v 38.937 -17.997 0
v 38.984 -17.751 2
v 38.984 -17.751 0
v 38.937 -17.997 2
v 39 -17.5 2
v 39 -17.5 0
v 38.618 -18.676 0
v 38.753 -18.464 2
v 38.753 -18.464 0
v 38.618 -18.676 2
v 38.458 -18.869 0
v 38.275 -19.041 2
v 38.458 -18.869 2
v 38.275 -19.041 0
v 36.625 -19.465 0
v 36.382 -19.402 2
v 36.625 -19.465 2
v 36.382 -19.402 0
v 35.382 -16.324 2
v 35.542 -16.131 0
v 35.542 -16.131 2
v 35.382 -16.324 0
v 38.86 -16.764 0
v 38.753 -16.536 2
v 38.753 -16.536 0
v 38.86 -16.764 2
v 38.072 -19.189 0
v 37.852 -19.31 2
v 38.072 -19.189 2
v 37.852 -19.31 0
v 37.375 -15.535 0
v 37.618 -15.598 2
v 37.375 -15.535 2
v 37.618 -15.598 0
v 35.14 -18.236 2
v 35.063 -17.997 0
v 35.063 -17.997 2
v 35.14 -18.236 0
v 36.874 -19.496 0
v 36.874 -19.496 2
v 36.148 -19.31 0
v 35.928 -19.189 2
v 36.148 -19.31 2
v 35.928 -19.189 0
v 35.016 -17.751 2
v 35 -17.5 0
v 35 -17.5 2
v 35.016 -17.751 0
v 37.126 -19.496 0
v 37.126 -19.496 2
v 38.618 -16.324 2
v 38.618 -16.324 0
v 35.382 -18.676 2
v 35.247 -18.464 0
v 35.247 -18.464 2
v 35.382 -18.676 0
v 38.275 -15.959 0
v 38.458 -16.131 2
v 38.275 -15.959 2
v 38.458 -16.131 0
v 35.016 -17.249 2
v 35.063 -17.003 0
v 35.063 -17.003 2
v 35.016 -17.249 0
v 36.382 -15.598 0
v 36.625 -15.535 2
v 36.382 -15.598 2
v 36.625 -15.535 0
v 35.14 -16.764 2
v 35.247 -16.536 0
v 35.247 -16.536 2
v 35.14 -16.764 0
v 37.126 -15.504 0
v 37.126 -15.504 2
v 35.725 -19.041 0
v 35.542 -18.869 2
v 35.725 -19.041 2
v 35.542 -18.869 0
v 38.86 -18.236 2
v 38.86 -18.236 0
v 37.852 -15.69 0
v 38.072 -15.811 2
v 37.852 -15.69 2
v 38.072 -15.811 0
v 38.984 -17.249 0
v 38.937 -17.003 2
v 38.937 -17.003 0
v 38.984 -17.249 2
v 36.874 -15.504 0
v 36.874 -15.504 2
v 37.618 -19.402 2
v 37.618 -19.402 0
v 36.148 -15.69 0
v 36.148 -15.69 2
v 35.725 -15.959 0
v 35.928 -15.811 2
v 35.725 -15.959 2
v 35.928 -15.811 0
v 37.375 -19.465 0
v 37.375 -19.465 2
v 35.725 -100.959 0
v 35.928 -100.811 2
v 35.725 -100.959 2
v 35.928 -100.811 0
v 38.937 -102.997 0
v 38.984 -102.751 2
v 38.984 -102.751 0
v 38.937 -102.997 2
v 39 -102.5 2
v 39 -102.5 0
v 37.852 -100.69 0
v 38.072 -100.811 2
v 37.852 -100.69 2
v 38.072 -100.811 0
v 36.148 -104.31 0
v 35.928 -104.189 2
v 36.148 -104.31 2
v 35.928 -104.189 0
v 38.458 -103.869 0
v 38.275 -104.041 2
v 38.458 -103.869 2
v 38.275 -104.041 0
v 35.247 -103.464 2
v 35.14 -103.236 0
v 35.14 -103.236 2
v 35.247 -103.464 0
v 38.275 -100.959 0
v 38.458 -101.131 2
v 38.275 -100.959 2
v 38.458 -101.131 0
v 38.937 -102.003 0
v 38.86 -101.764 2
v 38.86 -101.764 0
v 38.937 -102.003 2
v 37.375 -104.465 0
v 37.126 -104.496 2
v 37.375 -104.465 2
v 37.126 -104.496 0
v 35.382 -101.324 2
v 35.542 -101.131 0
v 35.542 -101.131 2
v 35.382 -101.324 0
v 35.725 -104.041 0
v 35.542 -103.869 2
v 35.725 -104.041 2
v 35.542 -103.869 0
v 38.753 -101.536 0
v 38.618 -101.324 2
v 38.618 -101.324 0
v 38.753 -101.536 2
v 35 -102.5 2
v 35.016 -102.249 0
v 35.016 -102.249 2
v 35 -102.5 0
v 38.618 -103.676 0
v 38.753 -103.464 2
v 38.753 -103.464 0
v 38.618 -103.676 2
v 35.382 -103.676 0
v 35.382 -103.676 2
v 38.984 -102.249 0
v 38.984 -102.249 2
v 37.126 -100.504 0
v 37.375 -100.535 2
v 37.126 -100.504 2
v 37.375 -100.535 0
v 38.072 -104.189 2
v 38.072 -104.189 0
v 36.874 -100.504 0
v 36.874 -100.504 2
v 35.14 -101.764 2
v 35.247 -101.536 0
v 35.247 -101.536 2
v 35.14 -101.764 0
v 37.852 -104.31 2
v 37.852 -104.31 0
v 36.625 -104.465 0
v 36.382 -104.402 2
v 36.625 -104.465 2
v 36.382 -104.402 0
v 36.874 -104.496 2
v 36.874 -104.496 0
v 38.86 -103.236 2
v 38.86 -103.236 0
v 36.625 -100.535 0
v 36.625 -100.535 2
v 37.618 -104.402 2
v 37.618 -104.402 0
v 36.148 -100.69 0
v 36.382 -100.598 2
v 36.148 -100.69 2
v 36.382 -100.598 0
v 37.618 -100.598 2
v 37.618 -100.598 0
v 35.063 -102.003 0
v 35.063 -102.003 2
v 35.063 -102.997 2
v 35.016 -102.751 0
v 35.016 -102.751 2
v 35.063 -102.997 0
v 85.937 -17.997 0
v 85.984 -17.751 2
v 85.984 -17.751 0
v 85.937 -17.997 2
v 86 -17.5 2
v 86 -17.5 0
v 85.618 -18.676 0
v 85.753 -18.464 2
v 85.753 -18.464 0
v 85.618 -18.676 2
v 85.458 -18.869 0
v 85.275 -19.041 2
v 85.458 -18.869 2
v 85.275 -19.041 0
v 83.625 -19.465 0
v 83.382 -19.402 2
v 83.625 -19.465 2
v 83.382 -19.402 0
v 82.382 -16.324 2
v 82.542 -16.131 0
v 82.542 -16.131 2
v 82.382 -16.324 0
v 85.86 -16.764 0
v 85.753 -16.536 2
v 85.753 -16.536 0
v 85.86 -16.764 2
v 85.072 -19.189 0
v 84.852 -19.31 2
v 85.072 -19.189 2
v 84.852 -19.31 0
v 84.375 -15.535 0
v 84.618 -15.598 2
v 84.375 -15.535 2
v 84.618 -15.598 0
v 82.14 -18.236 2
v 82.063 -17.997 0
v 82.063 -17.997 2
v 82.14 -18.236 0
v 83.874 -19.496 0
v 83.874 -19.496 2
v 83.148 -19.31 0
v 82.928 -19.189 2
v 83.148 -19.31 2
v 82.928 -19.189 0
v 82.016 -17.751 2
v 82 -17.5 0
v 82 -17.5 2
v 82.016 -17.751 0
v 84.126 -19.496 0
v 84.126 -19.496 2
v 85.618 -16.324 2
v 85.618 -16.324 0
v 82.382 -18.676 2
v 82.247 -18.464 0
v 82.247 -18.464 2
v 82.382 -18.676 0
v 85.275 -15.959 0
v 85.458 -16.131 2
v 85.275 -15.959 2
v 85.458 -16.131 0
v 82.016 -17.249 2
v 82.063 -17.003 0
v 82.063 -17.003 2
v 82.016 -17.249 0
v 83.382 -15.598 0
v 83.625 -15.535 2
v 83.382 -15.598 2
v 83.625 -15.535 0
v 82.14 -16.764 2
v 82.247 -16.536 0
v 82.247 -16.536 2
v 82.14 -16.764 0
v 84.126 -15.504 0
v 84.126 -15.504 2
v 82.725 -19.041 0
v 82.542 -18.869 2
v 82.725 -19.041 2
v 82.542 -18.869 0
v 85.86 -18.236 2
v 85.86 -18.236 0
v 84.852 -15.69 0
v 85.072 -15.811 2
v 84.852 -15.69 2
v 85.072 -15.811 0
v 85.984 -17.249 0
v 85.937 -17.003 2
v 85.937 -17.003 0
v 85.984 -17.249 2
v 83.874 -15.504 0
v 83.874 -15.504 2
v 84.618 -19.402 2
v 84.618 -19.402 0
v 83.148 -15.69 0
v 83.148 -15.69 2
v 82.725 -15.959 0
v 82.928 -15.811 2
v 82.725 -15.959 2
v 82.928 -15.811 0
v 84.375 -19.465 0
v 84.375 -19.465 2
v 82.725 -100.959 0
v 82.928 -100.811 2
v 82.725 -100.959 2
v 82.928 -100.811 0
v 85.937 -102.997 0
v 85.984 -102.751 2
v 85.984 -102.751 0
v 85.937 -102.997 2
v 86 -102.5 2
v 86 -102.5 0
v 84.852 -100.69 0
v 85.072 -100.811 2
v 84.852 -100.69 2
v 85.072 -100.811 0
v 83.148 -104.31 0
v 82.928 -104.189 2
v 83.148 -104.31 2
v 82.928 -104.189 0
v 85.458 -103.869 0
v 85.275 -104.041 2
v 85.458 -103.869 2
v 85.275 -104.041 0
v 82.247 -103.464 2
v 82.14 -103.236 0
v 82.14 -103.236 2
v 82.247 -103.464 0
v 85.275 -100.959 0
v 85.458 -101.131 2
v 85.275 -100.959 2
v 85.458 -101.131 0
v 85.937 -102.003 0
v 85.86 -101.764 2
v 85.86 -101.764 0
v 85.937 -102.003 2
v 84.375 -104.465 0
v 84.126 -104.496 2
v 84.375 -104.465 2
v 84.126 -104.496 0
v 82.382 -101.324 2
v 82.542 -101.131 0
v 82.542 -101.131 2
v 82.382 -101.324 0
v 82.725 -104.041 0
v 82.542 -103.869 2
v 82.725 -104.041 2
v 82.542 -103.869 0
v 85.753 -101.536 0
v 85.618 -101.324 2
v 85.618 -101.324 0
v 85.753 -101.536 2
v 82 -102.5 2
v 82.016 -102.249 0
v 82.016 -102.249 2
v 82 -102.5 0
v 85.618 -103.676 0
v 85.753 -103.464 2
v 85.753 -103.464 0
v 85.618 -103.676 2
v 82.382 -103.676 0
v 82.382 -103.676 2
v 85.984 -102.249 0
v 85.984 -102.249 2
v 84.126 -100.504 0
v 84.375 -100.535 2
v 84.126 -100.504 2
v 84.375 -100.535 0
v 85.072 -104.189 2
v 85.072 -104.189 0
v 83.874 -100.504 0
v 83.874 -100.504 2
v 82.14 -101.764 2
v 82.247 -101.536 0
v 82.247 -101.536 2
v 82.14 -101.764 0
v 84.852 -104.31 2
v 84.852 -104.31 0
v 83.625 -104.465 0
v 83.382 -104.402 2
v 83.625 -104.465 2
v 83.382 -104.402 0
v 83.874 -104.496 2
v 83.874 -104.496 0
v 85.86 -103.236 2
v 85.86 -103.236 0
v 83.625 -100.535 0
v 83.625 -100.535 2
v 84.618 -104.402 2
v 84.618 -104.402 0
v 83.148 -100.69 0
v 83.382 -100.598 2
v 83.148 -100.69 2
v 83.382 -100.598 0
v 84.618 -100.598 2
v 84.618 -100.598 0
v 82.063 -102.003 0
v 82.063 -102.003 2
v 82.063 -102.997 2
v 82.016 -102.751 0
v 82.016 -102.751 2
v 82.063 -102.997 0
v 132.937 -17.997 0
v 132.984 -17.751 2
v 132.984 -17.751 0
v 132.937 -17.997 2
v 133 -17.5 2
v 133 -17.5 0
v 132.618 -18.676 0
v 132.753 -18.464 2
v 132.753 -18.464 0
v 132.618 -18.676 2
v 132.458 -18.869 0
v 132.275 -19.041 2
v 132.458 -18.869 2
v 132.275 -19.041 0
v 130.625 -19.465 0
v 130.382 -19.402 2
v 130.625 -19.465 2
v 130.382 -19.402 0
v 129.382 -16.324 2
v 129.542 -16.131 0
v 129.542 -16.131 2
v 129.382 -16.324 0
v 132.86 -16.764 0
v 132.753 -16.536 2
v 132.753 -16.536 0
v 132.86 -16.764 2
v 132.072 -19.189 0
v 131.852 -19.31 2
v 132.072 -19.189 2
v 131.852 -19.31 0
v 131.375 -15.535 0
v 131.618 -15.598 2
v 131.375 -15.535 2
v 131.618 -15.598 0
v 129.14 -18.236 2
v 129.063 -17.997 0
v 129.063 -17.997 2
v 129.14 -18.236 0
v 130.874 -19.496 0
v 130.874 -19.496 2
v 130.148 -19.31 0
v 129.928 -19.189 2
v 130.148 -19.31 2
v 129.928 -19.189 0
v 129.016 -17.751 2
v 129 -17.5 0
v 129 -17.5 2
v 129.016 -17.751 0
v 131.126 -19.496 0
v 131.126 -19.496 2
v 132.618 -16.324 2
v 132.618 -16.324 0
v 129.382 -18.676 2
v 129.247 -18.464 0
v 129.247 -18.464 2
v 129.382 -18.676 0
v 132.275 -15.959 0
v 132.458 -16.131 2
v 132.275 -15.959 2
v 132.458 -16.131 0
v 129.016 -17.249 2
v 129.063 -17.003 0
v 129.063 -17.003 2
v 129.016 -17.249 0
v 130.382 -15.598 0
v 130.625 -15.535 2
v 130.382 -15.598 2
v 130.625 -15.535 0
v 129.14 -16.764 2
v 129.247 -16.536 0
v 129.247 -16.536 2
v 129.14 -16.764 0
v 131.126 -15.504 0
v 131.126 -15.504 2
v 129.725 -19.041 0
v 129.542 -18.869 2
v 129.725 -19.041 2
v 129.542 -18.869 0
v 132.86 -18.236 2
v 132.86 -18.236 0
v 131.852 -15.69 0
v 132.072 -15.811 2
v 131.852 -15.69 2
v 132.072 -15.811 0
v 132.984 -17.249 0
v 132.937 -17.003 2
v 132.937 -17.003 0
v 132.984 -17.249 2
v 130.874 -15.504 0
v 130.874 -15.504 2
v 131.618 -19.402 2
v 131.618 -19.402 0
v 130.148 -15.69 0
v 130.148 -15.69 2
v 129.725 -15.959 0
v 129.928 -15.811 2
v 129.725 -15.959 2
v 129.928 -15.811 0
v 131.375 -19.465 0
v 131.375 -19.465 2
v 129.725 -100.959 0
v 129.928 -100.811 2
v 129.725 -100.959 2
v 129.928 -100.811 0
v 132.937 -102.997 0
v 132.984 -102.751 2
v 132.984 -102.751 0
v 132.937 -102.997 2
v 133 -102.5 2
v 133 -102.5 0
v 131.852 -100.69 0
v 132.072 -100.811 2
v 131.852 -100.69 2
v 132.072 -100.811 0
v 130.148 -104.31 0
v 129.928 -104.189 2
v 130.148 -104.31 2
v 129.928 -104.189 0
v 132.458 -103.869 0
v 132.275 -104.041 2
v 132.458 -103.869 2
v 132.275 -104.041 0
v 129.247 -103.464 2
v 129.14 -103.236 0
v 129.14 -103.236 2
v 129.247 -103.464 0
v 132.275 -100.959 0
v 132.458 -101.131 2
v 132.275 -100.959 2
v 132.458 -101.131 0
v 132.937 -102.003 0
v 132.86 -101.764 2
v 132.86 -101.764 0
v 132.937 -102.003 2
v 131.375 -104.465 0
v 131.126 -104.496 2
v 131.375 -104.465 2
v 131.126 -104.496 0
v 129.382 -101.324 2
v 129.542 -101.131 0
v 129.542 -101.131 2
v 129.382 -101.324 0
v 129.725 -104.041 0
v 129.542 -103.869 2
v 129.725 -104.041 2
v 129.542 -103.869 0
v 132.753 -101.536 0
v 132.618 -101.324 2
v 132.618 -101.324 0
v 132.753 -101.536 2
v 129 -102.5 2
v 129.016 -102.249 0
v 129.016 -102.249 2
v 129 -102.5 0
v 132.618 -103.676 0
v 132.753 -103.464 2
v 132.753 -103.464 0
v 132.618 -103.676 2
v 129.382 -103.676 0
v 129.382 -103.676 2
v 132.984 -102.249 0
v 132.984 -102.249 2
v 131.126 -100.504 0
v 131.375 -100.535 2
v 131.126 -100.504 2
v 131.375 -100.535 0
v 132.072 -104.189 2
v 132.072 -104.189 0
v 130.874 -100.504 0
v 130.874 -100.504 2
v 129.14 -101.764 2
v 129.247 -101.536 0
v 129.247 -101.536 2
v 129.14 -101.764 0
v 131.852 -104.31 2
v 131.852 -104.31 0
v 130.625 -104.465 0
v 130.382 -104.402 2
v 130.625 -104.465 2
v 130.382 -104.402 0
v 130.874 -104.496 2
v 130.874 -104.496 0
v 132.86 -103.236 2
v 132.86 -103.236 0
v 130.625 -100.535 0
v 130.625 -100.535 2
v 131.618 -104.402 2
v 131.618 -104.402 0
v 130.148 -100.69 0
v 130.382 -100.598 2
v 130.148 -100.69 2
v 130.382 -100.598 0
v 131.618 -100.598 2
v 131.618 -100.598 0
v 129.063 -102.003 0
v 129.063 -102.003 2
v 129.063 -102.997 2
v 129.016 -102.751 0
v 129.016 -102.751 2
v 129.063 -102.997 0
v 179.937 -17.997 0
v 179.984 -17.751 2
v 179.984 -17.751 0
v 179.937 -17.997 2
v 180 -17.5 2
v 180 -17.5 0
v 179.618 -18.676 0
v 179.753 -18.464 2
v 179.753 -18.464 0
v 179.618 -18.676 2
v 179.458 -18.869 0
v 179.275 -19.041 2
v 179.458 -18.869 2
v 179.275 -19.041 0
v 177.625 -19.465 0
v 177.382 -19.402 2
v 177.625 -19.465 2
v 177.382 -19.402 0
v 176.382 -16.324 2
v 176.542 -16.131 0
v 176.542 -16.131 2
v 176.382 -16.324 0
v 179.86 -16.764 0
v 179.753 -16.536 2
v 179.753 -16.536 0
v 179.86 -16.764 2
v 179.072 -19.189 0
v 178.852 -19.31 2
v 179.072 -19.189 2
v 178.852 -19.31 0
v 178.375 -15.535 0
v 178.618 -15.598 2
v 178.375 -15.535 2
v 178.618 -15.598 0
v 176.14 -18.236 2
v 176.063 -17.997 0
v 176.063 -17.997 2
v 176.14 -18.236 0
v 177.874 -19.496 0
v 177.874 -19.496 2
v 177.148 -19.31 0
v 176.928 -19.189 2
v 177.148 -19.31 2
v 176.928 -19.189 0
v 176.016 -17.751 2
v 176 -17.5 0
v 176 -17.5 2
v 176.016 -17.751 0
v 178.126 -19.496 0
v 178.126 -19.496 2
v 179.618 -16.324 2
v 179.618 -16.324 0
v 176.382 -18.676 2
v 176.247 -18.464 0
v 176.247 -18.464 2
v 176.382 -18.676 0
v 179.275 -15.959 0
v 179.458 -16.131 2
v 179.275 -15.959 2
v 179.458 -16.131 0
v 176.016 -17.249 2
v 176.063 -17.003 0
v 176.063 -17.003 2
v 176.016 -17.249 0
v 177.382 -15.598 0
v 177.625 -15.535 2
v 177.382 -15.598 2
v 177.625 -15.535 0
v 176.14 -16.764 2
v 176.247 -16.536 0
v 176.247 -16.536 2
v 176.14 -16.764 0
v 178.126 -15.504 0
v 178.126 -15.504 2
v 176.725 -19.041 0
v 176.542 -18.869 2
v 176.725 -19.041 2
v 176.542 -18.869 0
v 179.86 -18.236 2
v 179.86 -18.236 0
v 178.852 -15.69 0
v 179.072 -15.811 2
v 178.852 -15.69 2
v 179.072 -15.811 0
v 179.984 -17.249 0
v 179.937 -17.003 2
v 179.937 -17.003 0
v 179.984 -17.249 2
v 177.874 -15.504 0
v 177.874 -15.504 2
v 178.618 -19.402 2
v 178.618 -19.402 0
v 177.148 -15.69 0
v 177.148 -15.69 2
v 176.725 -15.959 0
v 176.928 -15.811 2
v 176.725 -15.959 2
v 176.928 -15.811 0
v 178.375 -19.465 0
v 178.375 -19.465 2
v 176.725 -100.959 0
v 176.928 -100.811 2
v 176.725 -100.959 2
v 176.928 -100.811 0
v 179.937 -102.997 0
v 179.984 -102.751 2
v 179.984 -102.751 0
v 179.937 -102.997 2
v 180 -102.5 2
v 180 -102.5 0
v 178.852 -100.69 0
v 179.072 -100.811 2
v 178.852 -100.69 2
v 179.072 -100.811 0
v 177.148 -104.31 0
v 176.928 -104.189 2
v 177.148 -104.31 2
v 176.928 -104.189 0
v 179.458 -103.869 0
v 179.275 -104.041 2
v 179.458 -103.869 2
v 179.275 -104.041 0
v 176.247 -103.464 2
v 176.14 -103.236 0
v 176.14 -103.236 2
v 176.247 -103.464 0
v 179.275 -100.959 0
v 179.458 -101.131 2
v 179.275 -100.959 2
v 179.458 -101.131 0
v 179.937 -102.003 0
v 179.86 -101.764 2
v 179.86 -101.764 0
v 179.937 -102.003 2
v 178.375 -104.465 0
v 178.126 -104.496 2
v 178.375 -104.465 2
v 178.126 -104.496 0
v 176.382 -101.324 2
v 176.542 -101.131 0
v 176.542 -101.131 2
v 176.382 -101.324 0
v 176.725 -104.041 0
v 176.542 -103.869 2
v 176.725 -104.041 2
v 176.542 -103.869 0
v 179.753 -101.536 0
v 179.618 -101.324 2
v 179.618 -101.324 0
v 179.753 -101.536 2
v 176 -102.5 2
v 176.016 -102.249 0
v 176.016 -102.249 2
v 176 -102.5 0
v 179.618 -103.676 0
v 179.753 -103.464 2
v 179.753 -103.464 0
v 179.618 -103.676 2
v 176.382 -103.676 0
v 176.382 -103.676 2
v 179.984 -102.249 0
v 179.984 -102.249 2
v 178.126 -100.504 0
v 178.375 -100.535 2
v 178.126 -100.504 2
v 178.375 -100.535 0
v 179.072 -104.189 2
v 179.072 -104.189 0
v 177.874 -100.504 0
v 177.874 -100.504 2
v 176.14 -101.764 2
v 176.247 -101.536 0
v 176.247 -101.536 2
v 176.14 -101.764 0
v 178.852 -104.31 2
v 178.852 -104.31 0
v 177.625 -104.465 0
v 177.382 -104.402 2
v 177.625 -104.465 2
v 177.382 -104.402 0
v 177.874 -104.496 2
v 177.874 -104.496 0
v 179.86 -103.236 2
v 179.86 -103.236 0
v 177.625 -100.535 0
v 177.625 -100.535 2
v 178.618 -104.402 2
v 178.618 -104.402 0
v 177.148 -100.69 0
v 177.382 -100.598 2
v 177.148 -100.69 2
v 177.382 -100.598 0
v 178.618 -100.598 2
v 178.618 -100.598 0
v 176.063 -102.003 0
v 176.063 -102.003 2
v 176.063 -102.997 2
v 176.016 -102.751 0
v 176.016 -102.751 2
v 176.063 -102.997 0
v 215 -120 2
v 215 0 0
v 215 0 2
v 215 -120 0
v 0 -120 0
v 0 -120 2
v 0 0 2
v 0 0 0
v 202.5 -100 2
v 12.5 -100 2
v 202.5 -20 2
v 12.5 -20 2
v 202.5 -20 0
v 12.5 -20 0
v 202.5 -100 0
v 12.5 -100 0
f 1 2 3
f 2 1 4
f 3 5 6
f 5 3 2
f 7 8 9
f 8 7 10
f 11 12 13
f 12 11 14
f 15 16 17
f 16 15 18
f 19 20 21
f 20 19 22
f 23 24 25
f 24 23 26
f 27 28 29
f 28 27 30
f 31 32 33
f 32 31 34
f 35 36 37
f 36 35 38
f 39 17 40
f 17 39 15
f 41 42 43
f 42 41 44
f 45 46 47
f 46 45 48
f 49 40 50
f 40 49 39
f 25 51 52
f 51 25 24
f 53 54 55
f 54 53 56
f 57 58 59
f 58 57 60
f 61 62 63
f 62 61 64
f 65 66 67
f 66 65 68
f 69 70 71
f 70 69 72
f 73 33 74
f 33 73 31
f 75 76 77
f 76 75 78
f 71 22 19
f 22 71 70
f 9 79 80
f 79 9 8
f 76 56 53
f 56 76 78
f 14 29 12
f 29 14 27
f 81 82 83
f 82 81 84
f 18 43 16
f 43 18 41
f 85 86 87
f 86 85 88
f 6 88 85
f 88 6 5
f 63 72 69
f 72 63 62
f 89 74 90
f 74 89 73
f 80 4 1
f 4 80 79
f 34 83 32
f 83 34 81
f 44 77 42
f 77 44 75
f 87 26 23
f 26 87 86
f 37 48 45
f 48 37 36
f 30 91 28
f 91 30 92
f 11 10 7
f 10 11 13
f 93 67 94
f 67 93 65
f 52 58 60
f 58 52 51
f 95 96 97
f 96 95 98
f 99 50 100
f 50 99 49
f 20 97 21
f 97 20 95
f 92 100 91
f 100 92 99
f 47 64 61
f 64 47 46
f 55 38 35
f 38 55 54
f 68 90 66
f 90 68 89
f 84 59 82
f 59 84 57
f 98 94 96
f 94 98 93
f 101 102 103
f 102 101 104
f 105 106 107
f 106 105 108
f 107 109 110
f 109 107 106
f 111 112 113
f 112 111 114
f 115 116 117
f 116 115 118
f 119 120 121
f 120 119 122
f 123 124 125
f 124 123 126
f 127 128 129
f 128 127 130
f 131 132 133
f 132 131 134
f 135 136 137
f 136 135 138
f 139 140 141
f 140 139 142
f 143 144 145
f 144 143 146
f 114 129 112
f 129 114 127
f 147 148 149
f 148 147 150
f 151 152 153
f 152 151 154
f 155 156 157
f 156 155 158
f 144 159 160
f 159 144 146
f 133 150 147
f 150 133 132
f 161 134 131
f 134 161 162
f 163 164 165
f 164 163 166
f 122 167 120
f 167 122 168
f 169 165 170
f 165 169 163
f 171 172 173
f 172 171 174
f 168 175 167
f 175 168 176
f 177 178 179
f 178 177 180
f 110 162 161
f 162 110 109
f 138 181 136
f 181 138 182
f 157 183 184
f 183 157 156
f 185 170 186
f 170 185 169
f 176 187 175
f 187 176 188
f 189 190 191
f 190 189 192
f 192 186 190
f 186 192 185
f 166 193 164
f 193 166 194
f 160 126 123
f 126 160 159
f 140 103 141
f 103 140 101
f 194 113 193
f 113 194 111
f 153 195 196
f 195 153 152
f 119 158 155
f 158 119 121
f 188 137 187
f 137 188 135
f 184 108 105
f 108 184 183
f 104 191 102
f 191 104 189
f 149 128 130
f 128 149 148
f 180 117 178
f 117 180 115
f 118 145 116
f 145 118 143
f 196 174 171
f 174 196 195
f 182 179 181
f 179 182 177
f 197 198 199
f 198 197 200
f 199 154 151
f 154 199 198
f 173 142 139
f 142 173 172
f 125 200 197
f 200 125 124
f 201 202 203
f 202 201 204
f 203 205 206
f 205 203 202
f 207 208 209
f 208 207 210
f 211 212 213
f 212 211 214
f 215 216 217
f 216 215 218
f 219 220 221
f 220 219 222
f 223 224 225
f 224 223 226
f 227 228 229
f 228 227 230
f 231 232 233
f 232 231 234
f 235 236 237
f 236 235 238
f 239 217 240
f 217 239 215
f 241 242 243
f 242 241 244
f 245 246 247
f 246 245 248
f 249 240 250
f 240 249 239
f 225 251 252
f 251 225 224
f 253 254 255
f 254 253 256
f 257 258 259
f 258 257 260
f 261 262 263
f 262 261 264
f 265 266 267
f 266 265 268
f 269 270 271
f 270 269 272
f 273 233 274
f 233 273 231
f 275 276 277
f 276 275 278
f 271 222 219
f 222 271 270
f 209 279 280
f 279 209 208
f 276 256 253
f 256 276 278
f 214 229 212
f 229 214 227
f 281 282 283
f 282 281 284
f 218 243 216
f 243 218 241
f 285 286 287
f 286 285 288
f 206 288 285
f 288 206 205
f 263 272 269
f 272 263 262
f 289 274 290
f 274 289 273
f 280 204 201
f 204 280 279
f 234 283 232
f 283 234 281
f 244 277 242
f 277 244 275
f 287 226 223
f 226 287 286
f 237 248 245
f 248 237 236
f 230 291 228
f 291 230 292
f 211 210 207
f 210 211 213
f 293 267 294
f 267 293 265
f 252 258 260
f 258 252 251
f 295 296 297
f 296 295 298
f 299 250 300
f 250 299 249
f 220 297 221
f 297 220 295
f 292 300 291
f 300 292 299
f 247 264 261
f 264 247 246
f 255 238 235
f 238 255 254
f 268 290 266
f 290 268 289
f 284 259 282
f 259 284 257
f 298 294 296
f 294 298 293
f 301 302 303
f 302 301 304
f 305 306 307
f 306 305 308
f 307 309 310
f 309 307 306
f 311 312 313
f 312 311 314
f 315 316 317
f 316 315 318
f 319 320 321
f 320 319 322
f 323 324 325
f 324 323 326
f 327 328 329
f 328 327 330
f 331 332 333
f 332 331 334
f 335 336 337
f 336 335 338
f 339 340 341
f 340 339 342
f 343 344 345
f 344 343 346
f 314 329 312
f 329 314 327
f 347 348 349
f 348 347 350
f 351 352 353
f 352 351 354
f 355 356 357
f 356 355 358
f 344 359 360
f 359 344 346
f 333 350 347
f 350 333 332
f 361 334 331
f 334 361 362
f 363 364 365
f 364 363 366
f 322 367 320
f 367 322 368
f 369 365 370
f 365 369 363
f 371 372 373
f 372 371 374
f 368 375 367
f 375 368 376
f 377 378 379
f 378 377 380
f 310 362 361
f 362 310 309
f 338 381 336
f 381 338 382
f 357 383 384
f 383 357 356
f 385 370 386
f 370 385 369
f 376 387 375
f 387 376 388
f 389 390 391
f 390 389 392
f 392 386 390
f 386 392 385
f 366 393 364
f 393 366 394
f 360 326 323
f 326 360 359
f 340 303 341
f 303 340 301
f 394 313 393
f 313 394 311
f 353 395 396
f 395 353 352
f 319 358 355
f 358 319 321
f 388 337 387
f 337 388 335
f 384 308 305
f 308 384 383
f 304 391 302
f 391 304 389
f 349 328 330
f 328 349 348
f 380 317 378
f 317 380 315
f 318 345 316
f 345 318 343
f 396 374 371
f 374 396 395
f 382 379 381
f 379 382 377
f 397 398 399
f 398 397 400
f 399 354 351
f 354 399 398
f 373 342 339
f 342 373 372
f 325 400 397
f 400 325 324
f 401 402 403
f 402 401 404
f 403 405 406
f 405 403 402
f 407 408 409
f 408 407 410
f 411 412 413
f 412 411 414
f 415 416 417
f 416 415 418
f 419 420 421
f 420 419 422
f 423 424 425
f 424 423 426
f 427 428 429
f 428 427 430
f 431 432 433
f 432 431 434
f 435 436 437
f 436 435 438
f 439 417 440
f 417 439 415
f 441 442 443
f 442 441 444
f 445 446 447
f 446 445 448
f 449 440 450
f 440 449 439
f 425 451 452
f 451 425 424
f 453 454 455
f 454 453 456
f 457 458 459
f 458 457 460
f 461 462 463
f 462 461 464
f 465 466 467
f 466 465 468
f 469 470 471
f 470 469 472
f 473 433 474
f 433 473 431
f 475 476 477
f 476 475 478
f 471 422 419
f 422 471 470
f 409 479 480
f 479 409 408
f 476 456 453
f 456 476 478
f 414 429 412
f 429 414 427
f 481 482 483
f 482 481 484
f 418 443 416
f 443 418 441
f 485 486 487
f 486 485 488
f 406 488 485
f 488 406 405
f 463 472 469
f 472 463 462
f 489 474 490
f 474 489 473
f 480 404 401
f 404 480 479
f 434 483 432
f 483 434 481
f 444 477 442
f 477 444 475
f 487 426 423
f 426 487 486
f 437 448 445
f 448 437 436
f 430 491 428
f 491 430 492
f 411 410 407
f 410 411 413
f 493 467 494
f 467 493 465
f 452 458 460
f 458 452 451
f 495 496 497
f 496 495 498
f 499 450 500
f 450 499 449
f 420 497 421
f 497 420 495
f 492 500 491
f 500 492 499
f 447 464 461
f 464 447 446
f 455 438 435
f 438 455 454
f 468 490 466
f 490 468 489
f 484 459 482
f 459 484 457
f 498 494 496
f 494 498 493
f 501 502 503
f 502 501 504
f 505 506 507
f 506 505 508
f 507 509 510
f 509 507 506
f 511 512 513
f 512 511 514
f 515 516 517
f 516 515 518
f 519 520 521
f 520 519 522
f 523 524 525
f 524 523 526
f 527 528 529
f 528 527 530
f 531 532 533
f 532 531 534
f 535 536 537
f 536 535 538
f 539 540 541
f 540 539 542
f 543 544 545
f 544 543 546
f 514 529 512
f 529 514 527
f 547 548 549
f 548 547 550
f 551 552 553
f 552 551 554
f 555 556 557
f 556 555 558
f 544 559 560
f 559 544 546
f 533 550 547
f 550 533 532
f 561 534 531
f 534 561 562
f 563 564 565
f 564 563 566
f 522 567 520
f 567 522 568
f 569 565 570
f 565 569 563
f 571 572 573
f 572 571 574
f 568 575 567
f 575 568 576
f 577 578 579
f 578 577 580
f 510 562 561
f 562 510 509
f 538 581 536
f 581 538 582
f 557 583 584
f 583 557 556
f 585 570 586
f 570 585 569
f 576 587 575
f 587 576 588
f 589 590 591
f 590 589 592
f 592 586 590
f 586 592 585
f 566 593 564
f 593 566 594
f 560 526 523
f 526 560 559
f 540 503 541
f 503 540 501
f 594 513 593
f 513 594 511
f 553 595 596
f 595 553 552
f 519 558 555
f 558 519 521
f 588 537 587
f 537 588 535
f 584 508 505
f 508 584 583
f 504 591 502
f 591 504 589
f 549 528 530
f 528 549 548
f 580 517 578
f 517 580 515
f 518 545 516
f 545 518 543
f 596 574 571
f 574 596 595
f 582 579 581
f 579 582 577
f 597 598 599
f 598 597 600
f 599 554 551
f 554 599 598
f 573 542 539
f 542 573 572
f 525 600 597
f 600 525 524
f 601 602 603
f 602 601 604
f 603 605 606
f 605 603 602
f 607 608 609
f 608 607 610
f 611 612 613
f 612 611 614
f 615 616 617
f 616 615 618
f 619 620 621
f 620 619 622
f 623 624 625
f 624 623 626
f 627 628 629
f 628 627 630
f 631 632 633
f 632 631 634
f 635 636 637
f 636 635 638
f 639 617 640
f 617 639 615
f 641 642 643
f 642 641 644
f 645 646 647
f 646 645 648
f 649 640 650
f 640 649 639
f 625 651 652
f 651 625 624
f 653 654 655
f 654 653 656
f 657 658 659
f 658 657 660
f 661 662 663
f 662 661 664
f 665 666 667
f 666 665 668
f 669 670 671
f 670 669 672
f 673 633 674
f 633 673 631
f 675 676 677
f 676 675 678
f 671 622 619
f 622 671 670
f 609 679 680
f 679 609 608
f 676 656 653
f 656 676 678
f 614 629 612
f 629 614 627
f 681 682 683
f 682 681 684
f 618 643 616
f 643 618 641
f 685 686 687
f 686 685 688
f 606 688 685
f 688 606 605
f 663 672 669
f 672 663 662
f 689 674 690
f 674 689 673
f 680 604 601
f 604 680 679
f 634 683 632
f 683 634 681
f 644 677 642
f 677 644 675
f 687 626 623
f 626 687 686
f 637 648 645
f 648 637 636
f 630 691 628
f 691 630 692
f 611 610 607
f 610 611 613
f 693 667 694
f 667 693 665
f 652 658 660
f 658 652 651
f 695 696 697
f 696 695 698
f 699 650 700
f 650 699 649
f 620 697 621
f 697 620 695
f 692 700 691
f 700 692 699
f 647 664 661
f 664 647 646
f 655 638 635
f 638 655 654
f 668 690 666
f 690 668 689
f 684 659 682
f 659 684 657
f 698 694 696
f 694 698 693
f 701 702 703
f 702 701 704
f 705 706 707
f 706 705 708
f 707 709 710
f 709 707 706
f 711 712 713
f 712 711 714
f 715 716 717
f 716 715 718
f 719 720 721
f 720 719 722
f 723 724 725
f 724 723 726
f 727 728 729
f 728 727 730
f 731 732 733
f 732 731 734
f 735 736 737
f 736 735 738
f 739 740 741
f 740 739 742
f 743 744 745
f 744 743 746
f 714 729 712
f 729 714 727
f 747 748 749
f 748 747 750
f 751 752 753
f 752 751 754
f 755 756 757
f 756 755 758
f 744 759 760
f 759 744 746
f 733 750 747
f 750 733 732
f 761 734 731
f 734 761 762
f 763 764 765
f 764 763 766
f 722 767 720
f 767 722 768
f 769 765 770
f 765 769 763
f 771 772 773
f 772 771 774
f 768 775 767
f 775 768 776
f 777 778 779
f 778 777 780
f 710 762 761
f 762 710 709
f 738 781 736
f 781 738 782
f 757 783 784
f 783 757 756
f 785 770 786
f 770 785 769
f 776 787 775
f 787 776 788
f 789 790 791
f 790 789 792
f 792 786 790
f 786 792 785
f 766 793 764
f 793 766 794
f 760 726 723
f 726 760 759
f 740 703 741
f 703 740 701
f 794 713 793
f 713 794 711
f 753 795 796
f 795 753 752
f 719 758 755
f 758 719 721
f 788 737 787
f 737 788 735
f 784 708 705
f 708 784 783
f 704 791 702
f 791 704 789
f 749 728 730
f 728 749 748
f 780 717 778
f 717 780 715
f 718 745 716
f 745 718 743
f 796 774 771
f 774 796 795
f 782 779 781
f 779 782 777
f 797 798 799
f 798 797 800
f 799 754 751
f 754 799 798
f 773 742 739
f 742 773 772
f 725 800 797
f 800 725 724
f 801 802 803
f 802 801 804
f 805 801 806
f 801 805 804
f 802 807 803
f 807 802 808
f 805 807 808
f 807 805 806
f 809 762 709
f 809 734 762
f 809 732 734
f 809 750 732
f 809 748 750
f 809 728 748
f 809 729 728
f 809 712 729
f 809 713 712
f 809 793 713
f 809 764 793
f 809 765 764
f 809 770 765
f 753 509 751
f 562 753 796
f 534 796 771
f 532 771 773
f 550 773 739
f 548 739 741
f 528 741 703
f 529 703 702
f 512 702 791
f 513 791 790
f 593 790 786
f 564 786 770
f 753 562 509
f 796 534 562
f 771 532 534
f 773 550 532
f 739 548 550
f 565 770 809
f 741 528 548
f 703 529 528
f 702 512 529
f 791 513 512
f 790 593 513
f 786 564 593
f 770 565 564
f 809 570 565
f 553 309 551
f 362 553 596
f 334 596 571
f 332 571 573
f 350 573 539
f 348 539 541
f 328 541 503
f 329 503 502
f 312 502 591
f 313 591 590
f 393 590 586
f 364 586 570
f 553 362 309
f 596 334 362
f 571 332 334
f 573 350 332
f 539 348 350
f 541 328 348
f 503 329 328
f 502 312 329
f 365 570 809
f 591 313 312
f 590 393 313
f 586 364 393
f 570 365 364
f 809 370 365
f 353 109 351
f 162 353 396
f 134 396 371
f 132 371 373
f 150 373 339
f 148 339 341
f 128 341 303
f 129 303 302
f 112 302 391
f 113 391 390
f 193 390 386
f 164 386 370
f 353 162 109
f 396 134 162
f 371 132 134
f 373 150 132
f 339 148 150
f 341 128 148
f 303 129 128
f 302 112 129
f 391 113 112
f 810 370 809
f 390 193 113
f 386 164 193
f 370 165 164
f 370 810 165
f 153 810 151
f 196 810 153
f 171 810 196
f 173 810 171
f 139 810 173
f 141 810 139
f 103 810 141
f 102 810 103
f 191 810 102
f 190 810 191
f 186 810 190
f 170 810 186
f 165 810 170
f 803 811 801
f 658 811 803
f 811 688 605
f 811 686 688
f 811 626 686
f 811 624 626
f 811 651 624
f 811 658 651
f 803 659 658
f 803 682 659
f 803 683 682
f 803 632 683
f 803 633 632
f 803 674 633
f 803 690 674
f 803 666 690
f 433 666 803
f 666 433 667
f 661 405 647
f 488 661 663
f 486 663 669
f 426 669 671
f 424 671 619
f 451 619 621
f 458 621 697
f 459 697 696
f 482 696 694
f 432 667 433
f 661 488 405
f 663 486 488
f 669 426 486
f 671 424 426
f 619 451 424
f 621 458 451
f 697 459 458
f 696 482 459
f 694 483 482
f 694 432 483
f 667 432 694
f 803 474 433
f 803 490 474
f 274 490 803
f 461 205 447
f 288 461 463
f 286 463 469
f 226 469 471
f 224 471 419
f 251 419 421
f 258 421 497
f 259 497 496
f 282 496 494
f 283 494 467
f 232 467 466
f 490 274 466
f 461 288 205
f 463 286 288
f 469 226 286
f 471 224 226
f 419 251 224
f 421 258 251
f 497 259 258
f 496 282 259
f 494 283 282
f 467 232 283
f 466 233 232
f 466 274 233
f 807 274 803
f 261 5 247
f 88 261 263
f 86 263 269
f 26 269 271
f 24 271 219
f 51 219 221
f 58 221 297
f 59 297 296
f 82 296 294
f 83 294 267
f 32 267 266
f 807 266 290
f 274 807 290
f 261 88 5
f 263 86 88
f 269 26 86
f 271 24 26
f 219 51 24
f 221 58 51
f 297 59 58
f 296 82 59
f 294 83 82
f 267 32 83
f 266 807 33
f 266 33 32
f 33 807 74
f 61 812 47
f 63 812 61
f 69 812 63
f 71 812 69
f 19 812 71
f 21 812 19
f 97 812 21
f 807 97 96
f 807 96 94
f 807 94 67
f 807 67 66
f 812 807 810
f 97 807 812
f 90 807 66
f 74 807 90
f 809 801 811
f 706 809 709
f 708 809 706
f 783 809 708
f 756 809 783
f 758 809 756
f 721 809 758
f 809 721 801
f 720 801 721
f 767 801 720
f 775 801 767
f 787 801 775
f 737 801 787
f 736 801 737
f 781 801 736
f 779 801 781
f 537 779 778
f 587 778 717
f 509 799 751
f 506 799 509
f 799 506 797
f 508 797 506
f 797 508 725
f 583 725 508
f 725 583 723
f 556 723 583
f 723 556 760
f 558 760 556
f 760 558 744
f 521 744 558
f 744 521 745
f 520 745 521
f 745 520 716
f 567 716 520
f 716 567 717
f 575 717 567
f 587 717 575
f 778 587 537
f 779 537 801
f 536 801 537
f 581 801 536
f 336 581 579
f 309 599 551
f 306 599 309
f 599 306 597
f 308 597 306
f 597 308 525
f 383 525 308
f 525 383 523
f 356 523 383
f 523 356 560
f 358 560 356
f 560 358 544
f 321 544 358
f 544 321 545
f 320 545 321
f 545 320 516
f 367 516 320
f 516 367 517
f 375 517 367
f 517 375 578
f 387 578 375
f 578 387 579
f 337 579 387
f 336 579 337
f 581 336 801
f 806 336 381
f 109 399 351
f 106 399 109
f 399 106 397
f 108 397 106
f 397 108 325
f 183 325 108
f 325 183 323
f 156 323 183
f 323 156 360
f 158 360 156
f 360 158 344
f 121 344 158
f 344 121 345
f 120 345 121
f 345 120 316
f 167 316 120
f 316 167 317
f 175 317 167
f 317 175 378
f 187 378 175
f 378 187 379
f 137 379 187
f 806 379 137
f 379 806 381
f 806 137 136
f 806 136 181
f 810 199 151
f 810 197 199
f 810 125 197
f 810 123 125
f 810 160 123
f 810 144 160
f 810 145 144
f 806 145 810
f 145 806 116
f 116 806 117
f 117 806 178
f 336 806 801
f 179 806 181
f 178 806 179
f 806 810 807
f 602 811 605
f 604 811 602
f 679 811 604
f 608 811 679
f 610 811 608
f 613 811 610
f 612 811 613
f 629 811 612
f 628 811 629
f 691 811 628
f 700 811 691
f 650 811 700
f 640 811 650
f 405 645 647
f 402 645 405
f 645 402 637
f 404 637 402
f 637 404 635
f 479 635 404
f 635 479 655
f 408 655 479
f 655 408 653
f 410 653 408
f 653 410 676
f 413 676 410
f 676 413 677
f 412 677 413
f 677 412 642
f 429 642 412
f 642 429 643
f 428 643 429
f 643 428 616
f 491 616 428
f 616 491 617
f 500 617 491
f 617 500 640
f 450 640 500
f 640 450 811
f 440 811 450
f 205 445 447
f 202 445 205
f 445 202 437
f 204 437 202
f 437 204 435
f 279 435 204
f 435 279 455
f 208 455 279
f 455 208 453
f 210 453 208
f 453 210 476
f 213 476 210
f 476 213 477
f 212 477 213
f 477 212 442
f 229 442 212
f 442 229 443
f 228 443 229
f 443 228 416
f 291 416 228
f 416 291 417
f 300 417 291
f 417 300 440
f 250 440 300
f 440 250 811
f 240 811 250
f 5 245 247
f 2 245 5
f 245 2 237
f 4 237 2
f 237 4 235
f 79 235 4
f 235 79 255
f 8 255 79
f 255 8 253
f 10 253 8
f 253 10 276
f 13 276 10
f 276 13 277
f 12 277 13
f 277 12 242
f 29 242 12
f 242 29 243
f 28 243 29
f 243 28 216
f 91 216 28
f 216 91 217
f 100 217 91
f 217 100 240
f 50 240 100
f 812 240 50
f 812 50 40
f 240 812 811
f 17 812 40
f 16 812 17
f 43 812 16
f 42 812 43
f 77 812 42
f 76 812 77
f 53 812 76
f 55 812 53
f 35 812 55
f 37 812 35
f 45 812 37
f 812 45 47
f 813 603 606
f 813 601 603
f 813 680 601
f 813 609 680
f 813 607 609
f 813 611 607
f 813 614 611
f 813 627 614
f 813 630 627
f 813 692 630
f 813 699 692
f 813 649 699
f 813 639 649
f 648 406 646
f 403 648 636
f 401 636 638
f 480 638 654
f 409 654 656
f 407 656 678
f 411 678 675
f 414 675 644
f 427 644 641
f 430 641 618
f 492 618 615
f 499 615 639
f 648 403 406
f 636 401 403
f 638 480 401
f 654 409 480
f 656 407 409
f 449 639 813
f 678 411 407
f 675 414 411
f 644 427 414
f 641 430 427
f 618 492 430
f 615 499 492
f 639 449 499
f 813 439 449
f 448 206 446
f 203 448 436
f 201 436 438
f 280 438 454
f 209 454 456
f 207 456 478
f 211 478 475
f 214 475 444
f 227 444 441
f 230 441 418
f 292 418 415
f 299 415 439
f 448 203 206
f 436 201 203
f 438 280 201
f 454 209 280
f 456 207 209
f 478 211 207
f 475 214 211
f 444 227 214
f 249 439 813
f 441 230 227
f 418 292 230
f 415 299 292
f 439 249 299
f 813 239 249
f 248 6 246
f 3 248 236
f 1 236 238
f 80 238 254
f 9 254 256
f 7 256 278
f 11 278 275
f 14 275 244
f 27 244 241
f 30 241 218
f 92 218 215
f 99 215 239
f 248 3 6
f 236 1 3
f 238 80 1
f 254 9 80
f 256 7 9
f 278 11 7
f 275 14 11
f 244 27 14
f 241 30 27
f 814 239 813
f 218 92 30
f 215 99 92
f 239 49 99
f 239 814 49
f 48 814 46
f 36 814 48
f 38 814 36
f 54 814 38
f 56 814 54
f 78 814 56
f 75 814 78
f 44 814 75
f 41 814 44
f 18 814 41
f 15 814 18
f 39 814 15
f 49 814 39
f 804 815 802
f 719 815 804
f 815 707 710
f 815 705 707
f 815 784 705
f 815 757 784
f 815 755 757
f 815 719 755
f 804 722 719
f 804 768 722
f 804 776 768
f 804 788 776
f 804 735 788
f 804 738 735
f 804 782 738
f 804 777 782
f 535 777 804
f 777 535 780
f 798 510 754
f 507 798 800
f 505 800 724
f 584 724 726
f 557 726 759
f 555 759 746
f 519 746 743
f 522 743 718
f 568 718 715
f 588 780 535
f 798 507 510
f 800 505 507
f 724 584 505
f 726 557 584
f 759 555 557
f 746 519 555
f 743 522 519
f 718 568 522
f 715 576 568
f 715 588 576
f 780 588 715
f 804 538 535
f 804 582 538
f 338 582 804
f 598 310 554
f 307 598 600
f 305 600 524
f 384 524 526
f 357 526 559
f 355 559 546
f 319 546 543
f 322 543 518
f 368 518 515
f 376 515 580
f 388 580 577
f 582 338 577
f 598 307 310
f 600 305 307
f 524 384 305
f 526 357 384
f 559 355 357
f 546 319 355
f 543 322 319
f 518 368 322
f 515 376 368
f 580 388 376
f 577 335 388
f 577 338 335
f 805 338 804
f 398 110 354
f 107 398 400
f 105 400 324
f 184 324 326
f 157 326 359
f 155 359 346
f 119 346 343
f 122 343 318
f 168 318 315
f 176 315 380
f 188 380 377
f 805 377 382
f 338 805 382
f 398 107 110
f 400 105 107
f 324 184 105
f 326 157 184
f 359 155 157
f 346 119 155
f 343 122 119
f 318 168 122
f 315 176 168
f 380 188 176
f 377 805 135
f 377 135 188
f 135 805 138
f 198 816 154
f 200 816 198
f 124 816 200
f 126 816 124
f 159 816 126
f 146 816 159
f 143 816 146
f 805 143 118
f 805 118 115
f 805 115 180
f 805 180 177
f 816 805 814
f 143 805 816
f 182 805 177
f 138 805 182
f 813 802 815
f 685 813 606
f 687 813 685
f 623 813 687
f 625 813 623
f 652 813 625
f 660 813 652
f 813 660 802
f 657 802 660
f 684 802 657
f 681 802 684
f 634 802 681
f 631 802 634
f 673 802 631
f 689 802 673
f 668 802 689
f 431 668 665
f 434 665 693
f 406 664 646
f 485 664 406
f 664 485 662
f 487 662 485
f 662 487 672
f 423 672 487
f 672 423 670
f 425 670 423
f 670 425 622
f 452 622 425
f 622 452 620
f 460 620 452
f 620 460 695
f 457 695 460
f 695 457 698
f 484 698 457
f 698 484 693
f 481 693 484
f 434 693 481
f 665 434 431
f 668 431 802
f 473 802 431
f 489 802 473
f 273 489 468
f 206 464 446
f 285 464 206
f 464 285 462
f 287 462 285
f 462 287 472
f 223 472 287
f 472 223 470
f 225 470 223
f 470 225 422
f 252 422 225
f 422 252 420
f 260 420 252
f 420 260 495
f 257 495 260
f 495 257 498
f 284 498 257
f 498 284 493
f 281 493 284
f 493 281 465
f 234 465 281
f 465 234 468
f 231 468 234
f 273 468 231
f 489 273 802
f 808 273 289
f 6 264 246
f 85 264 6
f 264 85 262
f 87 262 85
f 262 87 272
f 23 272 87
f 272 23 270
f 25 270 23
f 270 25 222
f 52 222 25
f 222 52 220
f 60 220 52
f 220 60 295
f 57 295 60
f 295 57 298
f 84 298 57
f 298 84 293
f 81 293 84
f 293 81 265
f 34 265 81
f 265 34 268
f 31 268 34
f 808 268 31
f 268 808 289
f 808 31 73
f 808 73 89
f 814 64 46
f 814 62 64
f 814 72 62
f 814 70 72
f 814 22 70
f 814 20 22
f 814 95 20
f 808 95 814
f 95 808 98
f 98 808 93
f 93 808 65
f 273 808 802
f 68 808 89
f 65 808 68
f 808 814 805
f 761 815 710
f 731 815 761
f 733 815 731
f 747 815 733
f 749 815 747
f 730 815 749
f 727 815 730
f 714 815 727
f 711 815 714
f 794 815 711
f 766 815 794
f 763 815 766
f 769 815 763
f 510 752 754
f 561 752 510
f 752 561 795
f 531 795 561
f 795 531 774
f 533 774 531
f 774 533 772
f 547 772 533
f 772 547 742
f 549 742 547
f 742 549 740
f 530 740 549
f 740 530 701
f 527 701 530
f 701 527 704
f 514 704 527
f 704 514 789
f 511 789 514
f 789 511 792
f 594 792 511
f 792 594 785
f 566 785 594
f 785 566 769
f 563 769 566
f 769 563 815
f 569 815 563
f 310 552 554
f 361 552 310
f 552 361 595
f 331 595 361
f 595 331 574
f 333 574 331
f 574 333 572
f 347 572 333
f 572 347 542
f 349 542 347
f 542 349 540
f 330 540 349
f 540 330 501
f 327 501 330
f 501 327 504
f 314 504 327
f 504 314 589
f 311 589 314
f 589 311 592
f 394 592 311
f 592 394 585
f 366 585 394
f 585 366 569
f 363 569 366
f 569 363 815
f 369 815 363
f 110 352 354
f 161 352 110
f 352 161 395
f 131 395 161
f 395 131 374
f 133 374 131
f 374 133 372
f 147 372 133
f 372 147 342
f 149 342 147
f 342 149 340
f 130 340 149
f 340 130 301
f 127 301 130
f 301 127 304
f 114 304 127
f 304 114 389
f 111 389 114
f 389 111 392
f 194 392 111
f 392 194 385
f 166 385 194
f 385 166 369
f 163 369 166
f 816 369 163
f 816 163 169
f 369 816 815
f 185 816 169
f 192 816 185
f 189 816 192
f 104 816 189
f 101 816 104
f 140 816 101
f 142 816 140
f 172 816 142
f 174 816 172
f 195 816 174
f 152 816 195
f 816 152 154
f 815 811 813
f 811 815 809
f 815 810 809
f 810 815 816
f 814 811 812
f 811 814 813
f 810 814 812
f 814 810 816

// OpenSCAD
// file: ../pi_mount.scad
module Standoff(h, r1, r2){
  difference() {
    cylinder(h=h, r=r1, $fn=50);
    cylinder(h=h+0.01, r=r2, $fn=50);
  }
}

module PiMount(){
  cube([85, 56, 1]);
  translate([24.05, 16.55, 1]) Standoff(6, 3, 1.5);
  translate([78.55, 44.95, 1]) Standoff(6, 3, 1.5);
}

module RelayMount(height){
  cube([75, 55, 1]);
  inner = 1.4;
  outer = 3;
  translate([3, 3, 1]) Standoff(height, outer, inner);
  translate([72, 3, 1]) Standoff(height, outer, inner);
  translate([3, 52, 1]) Standoff(height, outer, inner);
  translate([72, 52, 1]) Standoff(height, outer, inner);
}

module BarrierStripMount(depth){
  translate([5, 11, -depth]) cylinder(h=depth+0.2, r=2, $fn=50);
  translate([120, 11, -depth]) cylinder(h=depth+0.2, r=2, $fn=50);
}

translate([-62.5, -11, 0]) difference(){
  BarrierStripMount(depth=1.5);
}
// file: ../outlet.scad
module OutletMount(depth, height) {
  translate([0, 0, -depth]){
    cylinder(h=depth+0.1, r=2, $fn=50);
    translate([0, height, 0]) cylinder(h=depth+0.1, r=2, $fn=50);
  }
}

module OutletsMount(n_outlets, spacing, outlet_depth, outlet_height){
  for (x = [0:spacing:(n_outlets - 1) * spacing]){
    translate([x, 0, 0]) OutletMount(depth=outlet_depth, height=outlet_height);
  }
}

rotate([90, 0, 0]) difference(){
  translate([-50, -50, -1]) cube([2000, 2000, 1]);
  color("blue") OutletsMount(n_outlets=4, spacing=47, outlet_depth=2, outlet_height=85);
}
// file: ../rat_trap.scad
use <outlet.scad>
use <pi_mount.scad>

module RatTrapBox(length=215, width=140, height=120, thickness=2){
  union() {
    BottomFace(length=length-thickness*2, width=width-thickness*2, thickness=thickness); 
    FrontFace(length=length, height=height, thickness=thickness, hole_length=190, hole_height=80);
    RearFace(length=length, height=height, box_width=width, thickness=thickness);
    LeftFace(width=width-thickness*2, height=height, thickness=thickness);
    RightFace(width=width-thickness*2, height=height, thickness=thickness, box_length=length);
  }
}

module FrontFace(length, height, thickness, hole_length, hole_height){
  difference() {
    cube([length, thickness, height]);
    // Make the hole
    translate([(length-hole_length)/2, -0.05, (height-hole_height)/2]) cube([hole_length, thickness+0.1, hole_height]);
    // Make outlet screw ports
    color("blue") translate([(length-141)/2, 0, (height-85)/2]){
      rotate([90, 0, 0]){
        OutletsMount(n_outlets=4, spacing=47, outlet_depth=20, outlet_height=85);
      }
    }
  }
}

module RearFace(length, height, box_width, thickness){
  translate([0, box_width-thickness, 0]){
    difference(){
      cube([length, thickness, height]);
      translate([length/2, -0.05, thickness + 10]){
        rotate([-90, 0, 0]) cylinder(h=thickness+0.1, r=5);
      }
    }
    translate([(length-85)/2 + 85, 0.99, (height-56)/2 + 56 + 10]){
      rotate([-90, 0, 180]) color("green") PiMount();
    }
  }
  
}

module BottomFace(length, width, thickness){
  translate([thickness, thickness, 0]){
  difference(){
    cube([length, width, thickness]);
    translate([(length-125)/2, 25, thickness]){
      color("orange") BarrierStripMount(depth=1.5);
    }
  }
  translate([(length-75)/2, (width-55)/2 + 10, thickness]){
    color("red") RelayMount(height=20);
  }
  }
}

module LeftFace(width, height, thickness){
  translate([0, thickness, 0]){
    cube([thickness, width, height]);
  }
}

module RightFace(width, height, thickness, box_length){
  translate([box_length-thickness, thickness, 0]){
    cube([thickness, width, height]);
    translate([0, width/2, (height-85)/2]){
      color("purple") rotate([0, -90, 0]) Standoff(h=10, r1=3, r2=1.25);
    }
    translate([0, width/2, height - (height-85)/2]){
      color("purple") rotate([0, -90, 0]) Standoff(h=10, r1=3, r2=1.25);
    }
  }
}

translate([-112.5, -75, -60]) RatTrapBox();
// main file
use <../rat_trap.scad>

rotate([90, 0, 0]) FrontFace(length=215, height=120, thickness=2, hole_length=190, hole_height=80);
